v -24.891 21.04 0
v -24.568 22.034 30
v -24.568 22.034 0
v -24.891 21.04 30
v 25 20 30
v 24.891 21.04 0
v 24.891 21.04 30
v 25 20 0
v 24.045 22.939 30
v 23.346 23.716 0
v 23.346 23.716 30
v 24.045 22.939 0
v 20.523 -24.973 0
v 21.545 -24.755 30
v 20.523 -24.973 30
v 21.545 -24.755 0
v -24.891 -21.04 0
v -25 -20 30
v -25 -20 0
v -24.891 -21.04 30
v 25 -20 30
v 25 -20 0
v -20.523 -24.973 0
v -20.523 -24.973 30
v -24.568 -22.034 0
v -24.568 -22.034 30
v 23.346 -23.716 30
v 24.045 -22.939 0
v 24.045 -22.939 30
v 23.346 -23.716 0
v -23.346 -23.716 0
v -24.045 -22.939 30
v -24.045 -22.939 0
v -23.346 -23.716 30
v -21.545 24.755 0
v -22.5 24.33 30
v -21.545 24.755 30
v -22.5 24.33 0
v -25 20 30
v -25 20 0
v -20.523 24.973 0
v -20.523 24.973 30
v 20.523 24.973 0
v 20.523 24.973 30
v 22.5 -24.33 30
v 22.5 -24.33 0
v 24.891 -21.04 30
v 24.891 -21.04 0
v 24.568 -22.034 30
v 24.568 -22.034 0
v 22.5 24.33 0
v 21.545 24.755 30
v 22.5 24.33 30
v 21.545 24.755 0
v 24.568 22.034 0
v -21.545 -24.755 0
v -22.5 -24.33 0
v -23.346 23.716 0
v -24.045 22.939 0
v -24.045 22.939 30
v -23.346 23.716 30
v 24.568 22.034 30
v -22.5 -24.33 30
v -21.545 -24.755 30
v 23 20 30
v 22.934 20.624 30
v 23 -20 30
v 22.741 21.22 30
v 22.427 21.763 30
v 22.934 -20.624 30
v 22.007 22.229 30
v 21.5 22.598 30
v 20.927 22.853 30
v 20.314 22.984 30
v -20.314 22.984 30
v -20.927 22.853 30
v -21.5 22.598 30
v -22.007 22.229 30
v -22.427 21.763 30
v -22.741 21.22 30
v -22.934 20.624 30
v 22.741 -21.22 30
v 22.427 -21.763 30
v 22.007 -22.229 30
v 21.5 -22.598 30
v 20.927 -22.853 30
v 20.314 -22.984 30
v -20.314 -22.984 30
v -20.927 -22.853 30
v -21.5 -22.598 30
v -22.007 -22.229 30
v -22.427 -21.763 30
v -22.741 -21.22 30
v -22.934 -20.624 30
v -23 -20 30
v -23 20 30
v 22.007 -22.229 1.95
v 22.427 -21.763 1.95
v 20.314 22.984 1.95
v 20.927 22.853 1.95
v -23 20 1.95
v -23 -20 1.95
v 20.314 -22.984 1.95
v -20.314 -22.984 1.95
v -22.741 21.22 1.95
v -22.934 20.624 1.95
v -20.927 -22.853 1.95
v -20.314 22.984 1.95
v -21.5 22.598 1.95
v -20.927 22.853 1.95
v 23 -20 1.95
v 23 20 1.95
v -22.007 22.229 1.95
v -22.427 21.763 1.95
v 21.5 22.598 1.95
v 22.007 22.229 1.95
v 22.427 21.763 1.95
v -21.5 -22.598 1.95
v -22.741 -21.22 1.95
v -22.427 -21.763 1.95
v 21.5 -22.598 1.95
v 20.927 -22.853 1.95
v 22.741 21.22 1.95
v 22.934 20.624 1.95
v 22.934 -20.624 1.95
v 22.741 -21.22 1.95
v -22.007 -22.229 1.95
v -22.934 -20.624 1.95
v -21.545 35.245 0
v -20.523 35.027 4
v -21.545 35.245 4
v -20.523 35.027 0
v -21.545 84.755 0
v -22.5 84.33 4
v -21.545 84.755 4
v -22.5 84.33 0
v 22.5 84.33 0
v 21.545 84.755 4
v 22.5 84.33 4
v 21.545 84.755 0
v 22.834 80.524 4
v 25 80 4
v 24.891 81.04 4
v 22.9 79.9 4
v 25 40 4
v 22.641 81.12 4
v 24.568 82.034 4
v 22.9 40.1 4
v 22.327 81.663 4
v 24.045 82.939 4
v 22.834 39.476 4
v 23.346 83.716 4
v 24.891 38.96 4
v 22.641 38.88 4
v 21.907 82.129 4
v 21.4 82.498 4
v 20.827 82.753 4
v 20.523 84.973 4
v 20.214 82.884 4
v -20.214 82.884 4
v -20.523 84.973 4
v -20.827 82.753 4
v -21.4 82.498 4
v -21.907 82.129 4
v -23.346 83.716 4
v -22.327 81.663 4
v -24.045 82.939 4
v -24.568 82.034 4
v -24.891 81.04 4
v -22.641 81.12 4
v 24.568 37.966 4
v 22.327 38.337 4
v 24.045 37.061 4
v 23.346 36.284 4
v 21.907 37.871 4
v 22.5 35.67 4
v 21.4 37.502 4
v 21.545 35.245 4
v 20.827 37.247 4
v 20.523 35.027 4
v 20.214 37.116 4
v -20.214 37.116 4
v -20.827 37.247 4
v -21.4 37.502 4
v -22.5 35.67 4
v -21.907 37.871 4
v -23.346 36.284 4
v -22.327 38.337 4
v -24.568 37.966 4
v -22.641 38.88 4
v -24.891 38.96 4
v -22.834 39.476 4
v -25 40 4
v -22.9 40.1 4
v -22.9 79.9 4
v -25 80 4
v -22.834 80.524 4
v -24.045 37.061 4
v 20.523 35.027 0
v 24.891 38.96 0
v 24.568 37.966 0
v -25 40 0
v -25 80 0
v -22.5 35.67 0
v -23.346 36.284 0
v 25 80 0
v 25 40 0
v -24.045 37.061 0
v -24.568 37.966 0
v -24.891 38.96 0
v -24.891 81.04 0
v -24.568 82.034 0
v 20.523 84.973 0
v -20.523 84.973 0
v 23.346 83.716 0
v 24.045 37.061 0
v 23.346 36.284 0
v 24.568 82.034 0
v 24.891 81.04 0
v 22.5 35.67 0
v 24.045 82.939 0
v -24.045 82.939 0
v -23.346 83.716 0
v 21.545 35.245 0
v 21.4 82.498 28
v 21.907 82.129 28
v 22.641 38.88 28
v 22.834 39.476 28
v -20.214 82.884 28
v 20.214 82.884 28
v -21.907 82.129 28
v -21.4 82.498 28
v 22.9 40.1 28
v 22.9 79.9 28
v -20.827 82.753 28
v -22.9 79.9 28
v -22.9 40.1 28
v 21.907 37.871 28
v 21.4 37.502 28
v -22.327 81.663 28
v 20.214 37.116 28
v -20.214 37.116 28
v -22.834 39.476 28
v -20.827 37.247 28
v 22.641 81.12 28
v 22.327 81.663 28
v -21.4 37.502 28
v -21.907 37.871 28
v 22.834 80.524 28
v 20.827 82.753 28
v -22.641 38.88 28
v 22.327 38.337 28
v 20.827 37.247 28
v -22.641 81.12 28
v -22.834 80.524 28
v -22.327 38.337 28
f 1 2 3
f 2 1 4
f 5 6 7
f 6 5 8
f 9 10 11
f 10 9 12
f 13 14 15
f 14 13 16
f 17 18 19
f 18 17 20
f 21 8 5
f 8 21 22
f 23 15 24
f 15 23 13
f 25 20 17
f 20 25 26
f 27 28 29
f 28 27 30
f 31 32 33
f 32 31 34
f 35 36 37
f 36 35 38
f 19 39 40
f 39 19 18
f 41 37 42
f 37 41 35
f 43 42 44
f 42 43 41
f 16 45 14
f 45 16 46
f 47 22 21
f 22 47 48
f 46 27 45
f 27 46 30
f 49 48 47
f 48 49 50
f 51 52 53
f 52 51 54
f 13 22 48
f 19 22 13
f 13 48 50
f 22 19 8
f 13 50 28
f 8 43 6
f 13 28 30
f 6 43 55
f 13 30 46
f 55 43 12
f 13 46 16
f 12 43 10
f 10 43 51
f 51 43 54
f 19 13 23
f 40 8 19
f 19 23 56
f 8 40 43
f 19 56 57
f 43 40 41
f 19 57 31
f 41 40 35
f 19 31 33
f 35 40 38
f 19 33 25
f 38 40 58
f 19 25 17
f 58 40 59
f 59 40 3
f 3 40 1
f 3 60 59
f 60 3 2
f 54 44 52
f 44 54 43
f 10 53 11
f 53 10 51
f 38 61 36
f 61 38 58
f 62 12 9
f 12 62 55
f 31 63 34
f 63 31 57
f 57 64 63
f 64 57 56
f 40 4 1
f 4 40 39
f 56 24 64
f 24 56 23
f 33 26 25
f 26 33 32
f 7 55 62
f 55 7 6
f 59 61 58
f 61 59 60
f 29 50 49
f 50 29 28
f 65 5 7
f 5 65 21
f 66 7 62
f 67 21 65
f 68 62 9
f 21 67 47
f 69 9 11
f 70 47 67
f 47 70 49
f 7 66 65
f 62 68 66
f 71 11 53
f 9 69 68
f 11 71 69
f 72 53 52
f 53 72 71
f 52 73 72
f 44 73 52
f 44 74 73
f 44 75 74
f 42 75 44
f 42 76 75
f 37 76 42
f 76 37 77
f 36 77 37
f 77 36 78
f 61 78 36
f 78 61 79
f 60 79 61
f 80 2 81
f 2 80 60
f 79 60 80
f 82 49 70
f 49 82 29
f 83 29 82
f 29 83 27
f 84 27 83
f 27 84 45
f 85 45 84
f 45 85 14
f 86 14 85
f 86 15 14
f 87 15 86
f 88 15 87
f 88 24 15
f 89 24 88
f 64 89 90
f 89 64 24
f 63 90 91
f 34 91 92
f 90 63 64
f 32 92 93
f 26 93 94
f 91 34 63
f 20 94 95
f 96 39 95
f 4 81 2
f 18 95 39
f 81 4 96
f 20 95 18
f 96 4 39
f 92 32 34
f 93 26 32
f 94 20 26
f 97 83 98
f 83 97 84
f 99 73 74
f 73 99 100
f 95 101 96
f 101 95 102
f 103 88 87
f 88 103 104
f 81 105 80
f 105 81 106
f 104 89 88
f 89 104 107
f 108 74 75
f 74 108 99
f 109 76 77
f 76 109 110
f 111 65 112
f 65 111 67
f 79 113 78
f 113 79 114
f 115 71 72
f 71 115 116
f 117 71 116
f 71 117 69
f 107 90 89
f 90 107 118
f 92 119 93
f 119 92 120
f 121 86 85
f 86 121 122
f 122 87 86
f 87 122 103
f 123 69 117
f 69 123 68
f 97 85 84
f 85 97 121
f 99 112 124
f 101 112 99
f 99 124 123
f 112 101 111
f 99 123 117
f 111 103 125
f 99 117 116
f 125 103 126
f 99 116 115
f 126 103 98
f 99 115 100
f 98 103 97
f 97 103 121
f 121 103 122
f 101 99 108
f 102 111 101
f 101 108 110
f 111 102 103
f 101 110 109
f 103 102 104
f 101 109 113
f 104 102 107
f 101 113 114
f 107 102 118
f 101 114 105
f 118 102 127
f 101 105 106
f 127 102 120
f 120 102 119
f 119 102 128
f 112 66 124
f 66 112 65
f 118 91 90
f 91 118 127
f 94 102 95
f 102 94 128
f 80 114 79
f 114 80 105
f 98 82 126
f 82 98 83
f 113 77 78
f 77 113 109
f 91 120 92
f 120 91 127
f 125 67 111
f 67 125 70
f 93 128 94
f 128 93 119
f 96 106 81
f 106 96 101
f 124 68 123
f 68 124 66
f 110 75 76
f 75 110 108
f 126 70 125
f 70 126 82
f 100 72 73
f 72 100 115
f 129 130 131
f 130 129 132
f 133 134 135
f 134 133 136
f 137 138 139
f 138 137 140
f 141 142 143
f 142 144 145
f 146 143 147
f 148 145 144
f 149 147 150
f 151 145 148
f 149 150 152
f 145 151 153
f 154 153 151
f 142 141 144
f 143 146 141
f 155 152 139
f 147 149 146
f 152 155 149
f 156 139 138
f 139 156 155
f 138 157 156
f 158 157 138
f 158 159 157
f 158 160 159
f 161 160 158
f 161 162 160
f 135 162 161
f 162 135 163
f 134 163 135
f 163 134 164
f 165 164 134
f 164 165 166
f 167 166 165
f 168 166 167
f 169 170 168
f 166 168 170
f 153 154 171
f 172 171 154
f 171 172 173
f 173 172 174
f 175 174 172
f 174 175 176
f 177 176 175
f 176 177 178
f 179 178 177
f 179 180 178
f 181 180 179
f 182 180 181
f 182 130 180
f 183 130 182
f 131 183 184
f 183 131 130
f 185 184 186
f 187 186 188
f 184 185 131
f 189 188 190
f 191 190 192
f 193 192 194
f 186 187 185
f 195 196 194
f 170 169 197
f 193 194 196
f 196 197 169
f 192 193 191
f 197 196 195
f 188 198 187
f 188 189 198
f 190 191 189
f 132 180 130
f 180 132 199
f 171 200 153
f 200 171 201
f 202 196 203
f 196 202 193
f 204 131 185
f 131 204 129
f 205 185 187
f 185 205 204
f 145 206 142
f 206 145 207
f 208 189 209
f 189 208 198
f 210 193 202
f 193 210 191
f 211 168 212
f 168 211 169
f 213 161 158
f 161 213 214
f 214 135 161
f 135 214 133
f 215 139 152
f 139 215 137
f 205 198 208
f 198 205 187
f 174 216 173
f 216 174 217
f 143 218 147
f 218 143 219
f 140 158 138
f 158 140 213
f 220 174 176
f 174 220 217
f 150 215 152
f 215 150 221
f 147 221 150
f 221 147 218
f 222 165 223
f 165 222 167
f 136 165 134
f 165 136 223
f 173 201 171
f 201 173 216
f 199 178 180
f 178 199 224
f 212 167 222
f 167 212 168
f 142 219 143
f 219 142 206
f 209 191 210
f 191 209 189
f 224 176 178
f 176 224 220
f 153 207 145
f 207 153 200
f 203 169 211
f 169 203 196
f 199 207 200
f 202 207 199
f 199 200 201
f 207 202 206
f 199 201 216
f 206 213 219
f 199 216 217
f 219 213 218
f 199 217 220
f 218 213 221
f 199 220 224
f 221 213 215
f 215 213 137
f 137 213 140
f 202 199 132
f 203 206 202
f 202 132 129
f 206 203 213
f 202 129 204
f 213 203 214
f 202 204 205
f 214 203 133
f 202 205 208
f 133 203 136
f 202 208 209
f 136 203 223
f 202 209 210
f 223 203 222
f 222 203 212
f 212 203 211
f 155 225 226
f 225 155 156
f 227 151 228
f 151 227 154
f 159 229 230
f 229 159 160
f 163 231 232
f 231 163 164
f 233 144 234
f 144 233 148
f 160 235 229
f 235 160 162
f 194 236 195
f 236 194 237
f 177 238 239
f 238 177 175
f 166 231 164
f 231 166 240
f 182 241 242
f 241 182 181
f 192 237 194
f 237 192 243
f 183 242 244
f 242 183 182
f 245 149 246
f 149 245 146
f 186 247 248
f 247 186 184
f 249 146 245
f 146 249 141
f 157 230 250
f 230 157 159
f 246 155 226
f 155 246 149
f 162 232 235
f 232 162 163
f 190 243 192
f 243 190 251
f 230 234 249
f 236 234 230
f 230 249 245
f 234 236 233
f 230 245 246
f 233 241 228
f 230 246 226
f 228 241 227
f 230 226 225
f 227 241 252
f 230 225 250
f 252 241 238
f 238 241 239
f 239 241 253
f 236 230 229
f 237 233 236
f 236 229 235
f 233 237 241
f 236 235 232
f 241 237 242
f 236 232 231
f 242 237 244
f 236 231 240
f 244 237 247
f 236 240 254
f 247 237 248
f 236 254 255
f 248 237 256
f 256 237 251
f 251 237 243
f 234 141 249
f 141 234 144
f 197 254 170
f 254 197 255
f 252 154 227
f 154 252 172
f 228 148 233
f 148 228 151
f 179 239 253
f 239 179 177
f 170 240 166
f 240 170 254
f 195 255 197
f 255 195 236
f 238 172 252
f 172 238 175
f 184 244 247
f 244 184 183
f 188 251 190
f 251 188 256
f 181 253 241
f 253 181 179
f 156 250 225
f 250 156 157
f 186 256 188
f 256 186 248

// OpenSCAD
// Parametric Box
// Customizable box with lid option

/* [Dimensions] */
width = 50;
depth = 50;
height = 30;
wall_thickness = 2;

/* [Style] */
corner_radius = 5;

/* [Features] */
lid = true;

// Main module
module box() {
    difference() {
        // Outer box
        translate([0, 0, height/2])
            roundedBox(width, depth, height, corner_radius);

        // Inner cavity
        translate([0, 0, wall_thickness + (height - wall_thickness)/2])
            roundedBox(
                width - 2*wall_thickness,
                depth - 2*wall_thickness,
                height - wall_thickness + 0.1,
                max(0, corner_radius - wall_thickness)
            );
    }
}

module box_lid() {
    lid_height = wall_thickness * 2;
    lid_lip = wall_thickness * 0.8;

    union() {
        // Lid top
        translate([0, 0, lid_height/2])
            roundedBox(width, depth, lid_height, corner_radius);

        // Lid lip that fits inside box
        translate([0, 0, lid_height + (height - wall_thickness - lid_height)/2])
            roundedBox(
                width - 2*wall_thickness - 0.2,
                depth - 2*wall_thickness - 0.2,
                height - wall_thickness - lid_height,
                max(0, corner_radius - wall_thickness)
            );
    }
}

module roundedBox(w, d, h, r) {
    if (r > 0) {
        hull() {
            for (x = [-(w/2-r), (w/2-r)]) {
                for (y = [-(d/2-r), (d/2-r)]) {
                    translate([x, y, 0])
                        cylinder(h=h, r=r, center=true, $fn=30);
                }
            }
        }
    } else {
        cube([w, d, h], center=true);
    }
}

// Render
if (lid) {
    box();
    translate([0, depth + 10, 0])
        box_lid();
} else {
    box();
}
